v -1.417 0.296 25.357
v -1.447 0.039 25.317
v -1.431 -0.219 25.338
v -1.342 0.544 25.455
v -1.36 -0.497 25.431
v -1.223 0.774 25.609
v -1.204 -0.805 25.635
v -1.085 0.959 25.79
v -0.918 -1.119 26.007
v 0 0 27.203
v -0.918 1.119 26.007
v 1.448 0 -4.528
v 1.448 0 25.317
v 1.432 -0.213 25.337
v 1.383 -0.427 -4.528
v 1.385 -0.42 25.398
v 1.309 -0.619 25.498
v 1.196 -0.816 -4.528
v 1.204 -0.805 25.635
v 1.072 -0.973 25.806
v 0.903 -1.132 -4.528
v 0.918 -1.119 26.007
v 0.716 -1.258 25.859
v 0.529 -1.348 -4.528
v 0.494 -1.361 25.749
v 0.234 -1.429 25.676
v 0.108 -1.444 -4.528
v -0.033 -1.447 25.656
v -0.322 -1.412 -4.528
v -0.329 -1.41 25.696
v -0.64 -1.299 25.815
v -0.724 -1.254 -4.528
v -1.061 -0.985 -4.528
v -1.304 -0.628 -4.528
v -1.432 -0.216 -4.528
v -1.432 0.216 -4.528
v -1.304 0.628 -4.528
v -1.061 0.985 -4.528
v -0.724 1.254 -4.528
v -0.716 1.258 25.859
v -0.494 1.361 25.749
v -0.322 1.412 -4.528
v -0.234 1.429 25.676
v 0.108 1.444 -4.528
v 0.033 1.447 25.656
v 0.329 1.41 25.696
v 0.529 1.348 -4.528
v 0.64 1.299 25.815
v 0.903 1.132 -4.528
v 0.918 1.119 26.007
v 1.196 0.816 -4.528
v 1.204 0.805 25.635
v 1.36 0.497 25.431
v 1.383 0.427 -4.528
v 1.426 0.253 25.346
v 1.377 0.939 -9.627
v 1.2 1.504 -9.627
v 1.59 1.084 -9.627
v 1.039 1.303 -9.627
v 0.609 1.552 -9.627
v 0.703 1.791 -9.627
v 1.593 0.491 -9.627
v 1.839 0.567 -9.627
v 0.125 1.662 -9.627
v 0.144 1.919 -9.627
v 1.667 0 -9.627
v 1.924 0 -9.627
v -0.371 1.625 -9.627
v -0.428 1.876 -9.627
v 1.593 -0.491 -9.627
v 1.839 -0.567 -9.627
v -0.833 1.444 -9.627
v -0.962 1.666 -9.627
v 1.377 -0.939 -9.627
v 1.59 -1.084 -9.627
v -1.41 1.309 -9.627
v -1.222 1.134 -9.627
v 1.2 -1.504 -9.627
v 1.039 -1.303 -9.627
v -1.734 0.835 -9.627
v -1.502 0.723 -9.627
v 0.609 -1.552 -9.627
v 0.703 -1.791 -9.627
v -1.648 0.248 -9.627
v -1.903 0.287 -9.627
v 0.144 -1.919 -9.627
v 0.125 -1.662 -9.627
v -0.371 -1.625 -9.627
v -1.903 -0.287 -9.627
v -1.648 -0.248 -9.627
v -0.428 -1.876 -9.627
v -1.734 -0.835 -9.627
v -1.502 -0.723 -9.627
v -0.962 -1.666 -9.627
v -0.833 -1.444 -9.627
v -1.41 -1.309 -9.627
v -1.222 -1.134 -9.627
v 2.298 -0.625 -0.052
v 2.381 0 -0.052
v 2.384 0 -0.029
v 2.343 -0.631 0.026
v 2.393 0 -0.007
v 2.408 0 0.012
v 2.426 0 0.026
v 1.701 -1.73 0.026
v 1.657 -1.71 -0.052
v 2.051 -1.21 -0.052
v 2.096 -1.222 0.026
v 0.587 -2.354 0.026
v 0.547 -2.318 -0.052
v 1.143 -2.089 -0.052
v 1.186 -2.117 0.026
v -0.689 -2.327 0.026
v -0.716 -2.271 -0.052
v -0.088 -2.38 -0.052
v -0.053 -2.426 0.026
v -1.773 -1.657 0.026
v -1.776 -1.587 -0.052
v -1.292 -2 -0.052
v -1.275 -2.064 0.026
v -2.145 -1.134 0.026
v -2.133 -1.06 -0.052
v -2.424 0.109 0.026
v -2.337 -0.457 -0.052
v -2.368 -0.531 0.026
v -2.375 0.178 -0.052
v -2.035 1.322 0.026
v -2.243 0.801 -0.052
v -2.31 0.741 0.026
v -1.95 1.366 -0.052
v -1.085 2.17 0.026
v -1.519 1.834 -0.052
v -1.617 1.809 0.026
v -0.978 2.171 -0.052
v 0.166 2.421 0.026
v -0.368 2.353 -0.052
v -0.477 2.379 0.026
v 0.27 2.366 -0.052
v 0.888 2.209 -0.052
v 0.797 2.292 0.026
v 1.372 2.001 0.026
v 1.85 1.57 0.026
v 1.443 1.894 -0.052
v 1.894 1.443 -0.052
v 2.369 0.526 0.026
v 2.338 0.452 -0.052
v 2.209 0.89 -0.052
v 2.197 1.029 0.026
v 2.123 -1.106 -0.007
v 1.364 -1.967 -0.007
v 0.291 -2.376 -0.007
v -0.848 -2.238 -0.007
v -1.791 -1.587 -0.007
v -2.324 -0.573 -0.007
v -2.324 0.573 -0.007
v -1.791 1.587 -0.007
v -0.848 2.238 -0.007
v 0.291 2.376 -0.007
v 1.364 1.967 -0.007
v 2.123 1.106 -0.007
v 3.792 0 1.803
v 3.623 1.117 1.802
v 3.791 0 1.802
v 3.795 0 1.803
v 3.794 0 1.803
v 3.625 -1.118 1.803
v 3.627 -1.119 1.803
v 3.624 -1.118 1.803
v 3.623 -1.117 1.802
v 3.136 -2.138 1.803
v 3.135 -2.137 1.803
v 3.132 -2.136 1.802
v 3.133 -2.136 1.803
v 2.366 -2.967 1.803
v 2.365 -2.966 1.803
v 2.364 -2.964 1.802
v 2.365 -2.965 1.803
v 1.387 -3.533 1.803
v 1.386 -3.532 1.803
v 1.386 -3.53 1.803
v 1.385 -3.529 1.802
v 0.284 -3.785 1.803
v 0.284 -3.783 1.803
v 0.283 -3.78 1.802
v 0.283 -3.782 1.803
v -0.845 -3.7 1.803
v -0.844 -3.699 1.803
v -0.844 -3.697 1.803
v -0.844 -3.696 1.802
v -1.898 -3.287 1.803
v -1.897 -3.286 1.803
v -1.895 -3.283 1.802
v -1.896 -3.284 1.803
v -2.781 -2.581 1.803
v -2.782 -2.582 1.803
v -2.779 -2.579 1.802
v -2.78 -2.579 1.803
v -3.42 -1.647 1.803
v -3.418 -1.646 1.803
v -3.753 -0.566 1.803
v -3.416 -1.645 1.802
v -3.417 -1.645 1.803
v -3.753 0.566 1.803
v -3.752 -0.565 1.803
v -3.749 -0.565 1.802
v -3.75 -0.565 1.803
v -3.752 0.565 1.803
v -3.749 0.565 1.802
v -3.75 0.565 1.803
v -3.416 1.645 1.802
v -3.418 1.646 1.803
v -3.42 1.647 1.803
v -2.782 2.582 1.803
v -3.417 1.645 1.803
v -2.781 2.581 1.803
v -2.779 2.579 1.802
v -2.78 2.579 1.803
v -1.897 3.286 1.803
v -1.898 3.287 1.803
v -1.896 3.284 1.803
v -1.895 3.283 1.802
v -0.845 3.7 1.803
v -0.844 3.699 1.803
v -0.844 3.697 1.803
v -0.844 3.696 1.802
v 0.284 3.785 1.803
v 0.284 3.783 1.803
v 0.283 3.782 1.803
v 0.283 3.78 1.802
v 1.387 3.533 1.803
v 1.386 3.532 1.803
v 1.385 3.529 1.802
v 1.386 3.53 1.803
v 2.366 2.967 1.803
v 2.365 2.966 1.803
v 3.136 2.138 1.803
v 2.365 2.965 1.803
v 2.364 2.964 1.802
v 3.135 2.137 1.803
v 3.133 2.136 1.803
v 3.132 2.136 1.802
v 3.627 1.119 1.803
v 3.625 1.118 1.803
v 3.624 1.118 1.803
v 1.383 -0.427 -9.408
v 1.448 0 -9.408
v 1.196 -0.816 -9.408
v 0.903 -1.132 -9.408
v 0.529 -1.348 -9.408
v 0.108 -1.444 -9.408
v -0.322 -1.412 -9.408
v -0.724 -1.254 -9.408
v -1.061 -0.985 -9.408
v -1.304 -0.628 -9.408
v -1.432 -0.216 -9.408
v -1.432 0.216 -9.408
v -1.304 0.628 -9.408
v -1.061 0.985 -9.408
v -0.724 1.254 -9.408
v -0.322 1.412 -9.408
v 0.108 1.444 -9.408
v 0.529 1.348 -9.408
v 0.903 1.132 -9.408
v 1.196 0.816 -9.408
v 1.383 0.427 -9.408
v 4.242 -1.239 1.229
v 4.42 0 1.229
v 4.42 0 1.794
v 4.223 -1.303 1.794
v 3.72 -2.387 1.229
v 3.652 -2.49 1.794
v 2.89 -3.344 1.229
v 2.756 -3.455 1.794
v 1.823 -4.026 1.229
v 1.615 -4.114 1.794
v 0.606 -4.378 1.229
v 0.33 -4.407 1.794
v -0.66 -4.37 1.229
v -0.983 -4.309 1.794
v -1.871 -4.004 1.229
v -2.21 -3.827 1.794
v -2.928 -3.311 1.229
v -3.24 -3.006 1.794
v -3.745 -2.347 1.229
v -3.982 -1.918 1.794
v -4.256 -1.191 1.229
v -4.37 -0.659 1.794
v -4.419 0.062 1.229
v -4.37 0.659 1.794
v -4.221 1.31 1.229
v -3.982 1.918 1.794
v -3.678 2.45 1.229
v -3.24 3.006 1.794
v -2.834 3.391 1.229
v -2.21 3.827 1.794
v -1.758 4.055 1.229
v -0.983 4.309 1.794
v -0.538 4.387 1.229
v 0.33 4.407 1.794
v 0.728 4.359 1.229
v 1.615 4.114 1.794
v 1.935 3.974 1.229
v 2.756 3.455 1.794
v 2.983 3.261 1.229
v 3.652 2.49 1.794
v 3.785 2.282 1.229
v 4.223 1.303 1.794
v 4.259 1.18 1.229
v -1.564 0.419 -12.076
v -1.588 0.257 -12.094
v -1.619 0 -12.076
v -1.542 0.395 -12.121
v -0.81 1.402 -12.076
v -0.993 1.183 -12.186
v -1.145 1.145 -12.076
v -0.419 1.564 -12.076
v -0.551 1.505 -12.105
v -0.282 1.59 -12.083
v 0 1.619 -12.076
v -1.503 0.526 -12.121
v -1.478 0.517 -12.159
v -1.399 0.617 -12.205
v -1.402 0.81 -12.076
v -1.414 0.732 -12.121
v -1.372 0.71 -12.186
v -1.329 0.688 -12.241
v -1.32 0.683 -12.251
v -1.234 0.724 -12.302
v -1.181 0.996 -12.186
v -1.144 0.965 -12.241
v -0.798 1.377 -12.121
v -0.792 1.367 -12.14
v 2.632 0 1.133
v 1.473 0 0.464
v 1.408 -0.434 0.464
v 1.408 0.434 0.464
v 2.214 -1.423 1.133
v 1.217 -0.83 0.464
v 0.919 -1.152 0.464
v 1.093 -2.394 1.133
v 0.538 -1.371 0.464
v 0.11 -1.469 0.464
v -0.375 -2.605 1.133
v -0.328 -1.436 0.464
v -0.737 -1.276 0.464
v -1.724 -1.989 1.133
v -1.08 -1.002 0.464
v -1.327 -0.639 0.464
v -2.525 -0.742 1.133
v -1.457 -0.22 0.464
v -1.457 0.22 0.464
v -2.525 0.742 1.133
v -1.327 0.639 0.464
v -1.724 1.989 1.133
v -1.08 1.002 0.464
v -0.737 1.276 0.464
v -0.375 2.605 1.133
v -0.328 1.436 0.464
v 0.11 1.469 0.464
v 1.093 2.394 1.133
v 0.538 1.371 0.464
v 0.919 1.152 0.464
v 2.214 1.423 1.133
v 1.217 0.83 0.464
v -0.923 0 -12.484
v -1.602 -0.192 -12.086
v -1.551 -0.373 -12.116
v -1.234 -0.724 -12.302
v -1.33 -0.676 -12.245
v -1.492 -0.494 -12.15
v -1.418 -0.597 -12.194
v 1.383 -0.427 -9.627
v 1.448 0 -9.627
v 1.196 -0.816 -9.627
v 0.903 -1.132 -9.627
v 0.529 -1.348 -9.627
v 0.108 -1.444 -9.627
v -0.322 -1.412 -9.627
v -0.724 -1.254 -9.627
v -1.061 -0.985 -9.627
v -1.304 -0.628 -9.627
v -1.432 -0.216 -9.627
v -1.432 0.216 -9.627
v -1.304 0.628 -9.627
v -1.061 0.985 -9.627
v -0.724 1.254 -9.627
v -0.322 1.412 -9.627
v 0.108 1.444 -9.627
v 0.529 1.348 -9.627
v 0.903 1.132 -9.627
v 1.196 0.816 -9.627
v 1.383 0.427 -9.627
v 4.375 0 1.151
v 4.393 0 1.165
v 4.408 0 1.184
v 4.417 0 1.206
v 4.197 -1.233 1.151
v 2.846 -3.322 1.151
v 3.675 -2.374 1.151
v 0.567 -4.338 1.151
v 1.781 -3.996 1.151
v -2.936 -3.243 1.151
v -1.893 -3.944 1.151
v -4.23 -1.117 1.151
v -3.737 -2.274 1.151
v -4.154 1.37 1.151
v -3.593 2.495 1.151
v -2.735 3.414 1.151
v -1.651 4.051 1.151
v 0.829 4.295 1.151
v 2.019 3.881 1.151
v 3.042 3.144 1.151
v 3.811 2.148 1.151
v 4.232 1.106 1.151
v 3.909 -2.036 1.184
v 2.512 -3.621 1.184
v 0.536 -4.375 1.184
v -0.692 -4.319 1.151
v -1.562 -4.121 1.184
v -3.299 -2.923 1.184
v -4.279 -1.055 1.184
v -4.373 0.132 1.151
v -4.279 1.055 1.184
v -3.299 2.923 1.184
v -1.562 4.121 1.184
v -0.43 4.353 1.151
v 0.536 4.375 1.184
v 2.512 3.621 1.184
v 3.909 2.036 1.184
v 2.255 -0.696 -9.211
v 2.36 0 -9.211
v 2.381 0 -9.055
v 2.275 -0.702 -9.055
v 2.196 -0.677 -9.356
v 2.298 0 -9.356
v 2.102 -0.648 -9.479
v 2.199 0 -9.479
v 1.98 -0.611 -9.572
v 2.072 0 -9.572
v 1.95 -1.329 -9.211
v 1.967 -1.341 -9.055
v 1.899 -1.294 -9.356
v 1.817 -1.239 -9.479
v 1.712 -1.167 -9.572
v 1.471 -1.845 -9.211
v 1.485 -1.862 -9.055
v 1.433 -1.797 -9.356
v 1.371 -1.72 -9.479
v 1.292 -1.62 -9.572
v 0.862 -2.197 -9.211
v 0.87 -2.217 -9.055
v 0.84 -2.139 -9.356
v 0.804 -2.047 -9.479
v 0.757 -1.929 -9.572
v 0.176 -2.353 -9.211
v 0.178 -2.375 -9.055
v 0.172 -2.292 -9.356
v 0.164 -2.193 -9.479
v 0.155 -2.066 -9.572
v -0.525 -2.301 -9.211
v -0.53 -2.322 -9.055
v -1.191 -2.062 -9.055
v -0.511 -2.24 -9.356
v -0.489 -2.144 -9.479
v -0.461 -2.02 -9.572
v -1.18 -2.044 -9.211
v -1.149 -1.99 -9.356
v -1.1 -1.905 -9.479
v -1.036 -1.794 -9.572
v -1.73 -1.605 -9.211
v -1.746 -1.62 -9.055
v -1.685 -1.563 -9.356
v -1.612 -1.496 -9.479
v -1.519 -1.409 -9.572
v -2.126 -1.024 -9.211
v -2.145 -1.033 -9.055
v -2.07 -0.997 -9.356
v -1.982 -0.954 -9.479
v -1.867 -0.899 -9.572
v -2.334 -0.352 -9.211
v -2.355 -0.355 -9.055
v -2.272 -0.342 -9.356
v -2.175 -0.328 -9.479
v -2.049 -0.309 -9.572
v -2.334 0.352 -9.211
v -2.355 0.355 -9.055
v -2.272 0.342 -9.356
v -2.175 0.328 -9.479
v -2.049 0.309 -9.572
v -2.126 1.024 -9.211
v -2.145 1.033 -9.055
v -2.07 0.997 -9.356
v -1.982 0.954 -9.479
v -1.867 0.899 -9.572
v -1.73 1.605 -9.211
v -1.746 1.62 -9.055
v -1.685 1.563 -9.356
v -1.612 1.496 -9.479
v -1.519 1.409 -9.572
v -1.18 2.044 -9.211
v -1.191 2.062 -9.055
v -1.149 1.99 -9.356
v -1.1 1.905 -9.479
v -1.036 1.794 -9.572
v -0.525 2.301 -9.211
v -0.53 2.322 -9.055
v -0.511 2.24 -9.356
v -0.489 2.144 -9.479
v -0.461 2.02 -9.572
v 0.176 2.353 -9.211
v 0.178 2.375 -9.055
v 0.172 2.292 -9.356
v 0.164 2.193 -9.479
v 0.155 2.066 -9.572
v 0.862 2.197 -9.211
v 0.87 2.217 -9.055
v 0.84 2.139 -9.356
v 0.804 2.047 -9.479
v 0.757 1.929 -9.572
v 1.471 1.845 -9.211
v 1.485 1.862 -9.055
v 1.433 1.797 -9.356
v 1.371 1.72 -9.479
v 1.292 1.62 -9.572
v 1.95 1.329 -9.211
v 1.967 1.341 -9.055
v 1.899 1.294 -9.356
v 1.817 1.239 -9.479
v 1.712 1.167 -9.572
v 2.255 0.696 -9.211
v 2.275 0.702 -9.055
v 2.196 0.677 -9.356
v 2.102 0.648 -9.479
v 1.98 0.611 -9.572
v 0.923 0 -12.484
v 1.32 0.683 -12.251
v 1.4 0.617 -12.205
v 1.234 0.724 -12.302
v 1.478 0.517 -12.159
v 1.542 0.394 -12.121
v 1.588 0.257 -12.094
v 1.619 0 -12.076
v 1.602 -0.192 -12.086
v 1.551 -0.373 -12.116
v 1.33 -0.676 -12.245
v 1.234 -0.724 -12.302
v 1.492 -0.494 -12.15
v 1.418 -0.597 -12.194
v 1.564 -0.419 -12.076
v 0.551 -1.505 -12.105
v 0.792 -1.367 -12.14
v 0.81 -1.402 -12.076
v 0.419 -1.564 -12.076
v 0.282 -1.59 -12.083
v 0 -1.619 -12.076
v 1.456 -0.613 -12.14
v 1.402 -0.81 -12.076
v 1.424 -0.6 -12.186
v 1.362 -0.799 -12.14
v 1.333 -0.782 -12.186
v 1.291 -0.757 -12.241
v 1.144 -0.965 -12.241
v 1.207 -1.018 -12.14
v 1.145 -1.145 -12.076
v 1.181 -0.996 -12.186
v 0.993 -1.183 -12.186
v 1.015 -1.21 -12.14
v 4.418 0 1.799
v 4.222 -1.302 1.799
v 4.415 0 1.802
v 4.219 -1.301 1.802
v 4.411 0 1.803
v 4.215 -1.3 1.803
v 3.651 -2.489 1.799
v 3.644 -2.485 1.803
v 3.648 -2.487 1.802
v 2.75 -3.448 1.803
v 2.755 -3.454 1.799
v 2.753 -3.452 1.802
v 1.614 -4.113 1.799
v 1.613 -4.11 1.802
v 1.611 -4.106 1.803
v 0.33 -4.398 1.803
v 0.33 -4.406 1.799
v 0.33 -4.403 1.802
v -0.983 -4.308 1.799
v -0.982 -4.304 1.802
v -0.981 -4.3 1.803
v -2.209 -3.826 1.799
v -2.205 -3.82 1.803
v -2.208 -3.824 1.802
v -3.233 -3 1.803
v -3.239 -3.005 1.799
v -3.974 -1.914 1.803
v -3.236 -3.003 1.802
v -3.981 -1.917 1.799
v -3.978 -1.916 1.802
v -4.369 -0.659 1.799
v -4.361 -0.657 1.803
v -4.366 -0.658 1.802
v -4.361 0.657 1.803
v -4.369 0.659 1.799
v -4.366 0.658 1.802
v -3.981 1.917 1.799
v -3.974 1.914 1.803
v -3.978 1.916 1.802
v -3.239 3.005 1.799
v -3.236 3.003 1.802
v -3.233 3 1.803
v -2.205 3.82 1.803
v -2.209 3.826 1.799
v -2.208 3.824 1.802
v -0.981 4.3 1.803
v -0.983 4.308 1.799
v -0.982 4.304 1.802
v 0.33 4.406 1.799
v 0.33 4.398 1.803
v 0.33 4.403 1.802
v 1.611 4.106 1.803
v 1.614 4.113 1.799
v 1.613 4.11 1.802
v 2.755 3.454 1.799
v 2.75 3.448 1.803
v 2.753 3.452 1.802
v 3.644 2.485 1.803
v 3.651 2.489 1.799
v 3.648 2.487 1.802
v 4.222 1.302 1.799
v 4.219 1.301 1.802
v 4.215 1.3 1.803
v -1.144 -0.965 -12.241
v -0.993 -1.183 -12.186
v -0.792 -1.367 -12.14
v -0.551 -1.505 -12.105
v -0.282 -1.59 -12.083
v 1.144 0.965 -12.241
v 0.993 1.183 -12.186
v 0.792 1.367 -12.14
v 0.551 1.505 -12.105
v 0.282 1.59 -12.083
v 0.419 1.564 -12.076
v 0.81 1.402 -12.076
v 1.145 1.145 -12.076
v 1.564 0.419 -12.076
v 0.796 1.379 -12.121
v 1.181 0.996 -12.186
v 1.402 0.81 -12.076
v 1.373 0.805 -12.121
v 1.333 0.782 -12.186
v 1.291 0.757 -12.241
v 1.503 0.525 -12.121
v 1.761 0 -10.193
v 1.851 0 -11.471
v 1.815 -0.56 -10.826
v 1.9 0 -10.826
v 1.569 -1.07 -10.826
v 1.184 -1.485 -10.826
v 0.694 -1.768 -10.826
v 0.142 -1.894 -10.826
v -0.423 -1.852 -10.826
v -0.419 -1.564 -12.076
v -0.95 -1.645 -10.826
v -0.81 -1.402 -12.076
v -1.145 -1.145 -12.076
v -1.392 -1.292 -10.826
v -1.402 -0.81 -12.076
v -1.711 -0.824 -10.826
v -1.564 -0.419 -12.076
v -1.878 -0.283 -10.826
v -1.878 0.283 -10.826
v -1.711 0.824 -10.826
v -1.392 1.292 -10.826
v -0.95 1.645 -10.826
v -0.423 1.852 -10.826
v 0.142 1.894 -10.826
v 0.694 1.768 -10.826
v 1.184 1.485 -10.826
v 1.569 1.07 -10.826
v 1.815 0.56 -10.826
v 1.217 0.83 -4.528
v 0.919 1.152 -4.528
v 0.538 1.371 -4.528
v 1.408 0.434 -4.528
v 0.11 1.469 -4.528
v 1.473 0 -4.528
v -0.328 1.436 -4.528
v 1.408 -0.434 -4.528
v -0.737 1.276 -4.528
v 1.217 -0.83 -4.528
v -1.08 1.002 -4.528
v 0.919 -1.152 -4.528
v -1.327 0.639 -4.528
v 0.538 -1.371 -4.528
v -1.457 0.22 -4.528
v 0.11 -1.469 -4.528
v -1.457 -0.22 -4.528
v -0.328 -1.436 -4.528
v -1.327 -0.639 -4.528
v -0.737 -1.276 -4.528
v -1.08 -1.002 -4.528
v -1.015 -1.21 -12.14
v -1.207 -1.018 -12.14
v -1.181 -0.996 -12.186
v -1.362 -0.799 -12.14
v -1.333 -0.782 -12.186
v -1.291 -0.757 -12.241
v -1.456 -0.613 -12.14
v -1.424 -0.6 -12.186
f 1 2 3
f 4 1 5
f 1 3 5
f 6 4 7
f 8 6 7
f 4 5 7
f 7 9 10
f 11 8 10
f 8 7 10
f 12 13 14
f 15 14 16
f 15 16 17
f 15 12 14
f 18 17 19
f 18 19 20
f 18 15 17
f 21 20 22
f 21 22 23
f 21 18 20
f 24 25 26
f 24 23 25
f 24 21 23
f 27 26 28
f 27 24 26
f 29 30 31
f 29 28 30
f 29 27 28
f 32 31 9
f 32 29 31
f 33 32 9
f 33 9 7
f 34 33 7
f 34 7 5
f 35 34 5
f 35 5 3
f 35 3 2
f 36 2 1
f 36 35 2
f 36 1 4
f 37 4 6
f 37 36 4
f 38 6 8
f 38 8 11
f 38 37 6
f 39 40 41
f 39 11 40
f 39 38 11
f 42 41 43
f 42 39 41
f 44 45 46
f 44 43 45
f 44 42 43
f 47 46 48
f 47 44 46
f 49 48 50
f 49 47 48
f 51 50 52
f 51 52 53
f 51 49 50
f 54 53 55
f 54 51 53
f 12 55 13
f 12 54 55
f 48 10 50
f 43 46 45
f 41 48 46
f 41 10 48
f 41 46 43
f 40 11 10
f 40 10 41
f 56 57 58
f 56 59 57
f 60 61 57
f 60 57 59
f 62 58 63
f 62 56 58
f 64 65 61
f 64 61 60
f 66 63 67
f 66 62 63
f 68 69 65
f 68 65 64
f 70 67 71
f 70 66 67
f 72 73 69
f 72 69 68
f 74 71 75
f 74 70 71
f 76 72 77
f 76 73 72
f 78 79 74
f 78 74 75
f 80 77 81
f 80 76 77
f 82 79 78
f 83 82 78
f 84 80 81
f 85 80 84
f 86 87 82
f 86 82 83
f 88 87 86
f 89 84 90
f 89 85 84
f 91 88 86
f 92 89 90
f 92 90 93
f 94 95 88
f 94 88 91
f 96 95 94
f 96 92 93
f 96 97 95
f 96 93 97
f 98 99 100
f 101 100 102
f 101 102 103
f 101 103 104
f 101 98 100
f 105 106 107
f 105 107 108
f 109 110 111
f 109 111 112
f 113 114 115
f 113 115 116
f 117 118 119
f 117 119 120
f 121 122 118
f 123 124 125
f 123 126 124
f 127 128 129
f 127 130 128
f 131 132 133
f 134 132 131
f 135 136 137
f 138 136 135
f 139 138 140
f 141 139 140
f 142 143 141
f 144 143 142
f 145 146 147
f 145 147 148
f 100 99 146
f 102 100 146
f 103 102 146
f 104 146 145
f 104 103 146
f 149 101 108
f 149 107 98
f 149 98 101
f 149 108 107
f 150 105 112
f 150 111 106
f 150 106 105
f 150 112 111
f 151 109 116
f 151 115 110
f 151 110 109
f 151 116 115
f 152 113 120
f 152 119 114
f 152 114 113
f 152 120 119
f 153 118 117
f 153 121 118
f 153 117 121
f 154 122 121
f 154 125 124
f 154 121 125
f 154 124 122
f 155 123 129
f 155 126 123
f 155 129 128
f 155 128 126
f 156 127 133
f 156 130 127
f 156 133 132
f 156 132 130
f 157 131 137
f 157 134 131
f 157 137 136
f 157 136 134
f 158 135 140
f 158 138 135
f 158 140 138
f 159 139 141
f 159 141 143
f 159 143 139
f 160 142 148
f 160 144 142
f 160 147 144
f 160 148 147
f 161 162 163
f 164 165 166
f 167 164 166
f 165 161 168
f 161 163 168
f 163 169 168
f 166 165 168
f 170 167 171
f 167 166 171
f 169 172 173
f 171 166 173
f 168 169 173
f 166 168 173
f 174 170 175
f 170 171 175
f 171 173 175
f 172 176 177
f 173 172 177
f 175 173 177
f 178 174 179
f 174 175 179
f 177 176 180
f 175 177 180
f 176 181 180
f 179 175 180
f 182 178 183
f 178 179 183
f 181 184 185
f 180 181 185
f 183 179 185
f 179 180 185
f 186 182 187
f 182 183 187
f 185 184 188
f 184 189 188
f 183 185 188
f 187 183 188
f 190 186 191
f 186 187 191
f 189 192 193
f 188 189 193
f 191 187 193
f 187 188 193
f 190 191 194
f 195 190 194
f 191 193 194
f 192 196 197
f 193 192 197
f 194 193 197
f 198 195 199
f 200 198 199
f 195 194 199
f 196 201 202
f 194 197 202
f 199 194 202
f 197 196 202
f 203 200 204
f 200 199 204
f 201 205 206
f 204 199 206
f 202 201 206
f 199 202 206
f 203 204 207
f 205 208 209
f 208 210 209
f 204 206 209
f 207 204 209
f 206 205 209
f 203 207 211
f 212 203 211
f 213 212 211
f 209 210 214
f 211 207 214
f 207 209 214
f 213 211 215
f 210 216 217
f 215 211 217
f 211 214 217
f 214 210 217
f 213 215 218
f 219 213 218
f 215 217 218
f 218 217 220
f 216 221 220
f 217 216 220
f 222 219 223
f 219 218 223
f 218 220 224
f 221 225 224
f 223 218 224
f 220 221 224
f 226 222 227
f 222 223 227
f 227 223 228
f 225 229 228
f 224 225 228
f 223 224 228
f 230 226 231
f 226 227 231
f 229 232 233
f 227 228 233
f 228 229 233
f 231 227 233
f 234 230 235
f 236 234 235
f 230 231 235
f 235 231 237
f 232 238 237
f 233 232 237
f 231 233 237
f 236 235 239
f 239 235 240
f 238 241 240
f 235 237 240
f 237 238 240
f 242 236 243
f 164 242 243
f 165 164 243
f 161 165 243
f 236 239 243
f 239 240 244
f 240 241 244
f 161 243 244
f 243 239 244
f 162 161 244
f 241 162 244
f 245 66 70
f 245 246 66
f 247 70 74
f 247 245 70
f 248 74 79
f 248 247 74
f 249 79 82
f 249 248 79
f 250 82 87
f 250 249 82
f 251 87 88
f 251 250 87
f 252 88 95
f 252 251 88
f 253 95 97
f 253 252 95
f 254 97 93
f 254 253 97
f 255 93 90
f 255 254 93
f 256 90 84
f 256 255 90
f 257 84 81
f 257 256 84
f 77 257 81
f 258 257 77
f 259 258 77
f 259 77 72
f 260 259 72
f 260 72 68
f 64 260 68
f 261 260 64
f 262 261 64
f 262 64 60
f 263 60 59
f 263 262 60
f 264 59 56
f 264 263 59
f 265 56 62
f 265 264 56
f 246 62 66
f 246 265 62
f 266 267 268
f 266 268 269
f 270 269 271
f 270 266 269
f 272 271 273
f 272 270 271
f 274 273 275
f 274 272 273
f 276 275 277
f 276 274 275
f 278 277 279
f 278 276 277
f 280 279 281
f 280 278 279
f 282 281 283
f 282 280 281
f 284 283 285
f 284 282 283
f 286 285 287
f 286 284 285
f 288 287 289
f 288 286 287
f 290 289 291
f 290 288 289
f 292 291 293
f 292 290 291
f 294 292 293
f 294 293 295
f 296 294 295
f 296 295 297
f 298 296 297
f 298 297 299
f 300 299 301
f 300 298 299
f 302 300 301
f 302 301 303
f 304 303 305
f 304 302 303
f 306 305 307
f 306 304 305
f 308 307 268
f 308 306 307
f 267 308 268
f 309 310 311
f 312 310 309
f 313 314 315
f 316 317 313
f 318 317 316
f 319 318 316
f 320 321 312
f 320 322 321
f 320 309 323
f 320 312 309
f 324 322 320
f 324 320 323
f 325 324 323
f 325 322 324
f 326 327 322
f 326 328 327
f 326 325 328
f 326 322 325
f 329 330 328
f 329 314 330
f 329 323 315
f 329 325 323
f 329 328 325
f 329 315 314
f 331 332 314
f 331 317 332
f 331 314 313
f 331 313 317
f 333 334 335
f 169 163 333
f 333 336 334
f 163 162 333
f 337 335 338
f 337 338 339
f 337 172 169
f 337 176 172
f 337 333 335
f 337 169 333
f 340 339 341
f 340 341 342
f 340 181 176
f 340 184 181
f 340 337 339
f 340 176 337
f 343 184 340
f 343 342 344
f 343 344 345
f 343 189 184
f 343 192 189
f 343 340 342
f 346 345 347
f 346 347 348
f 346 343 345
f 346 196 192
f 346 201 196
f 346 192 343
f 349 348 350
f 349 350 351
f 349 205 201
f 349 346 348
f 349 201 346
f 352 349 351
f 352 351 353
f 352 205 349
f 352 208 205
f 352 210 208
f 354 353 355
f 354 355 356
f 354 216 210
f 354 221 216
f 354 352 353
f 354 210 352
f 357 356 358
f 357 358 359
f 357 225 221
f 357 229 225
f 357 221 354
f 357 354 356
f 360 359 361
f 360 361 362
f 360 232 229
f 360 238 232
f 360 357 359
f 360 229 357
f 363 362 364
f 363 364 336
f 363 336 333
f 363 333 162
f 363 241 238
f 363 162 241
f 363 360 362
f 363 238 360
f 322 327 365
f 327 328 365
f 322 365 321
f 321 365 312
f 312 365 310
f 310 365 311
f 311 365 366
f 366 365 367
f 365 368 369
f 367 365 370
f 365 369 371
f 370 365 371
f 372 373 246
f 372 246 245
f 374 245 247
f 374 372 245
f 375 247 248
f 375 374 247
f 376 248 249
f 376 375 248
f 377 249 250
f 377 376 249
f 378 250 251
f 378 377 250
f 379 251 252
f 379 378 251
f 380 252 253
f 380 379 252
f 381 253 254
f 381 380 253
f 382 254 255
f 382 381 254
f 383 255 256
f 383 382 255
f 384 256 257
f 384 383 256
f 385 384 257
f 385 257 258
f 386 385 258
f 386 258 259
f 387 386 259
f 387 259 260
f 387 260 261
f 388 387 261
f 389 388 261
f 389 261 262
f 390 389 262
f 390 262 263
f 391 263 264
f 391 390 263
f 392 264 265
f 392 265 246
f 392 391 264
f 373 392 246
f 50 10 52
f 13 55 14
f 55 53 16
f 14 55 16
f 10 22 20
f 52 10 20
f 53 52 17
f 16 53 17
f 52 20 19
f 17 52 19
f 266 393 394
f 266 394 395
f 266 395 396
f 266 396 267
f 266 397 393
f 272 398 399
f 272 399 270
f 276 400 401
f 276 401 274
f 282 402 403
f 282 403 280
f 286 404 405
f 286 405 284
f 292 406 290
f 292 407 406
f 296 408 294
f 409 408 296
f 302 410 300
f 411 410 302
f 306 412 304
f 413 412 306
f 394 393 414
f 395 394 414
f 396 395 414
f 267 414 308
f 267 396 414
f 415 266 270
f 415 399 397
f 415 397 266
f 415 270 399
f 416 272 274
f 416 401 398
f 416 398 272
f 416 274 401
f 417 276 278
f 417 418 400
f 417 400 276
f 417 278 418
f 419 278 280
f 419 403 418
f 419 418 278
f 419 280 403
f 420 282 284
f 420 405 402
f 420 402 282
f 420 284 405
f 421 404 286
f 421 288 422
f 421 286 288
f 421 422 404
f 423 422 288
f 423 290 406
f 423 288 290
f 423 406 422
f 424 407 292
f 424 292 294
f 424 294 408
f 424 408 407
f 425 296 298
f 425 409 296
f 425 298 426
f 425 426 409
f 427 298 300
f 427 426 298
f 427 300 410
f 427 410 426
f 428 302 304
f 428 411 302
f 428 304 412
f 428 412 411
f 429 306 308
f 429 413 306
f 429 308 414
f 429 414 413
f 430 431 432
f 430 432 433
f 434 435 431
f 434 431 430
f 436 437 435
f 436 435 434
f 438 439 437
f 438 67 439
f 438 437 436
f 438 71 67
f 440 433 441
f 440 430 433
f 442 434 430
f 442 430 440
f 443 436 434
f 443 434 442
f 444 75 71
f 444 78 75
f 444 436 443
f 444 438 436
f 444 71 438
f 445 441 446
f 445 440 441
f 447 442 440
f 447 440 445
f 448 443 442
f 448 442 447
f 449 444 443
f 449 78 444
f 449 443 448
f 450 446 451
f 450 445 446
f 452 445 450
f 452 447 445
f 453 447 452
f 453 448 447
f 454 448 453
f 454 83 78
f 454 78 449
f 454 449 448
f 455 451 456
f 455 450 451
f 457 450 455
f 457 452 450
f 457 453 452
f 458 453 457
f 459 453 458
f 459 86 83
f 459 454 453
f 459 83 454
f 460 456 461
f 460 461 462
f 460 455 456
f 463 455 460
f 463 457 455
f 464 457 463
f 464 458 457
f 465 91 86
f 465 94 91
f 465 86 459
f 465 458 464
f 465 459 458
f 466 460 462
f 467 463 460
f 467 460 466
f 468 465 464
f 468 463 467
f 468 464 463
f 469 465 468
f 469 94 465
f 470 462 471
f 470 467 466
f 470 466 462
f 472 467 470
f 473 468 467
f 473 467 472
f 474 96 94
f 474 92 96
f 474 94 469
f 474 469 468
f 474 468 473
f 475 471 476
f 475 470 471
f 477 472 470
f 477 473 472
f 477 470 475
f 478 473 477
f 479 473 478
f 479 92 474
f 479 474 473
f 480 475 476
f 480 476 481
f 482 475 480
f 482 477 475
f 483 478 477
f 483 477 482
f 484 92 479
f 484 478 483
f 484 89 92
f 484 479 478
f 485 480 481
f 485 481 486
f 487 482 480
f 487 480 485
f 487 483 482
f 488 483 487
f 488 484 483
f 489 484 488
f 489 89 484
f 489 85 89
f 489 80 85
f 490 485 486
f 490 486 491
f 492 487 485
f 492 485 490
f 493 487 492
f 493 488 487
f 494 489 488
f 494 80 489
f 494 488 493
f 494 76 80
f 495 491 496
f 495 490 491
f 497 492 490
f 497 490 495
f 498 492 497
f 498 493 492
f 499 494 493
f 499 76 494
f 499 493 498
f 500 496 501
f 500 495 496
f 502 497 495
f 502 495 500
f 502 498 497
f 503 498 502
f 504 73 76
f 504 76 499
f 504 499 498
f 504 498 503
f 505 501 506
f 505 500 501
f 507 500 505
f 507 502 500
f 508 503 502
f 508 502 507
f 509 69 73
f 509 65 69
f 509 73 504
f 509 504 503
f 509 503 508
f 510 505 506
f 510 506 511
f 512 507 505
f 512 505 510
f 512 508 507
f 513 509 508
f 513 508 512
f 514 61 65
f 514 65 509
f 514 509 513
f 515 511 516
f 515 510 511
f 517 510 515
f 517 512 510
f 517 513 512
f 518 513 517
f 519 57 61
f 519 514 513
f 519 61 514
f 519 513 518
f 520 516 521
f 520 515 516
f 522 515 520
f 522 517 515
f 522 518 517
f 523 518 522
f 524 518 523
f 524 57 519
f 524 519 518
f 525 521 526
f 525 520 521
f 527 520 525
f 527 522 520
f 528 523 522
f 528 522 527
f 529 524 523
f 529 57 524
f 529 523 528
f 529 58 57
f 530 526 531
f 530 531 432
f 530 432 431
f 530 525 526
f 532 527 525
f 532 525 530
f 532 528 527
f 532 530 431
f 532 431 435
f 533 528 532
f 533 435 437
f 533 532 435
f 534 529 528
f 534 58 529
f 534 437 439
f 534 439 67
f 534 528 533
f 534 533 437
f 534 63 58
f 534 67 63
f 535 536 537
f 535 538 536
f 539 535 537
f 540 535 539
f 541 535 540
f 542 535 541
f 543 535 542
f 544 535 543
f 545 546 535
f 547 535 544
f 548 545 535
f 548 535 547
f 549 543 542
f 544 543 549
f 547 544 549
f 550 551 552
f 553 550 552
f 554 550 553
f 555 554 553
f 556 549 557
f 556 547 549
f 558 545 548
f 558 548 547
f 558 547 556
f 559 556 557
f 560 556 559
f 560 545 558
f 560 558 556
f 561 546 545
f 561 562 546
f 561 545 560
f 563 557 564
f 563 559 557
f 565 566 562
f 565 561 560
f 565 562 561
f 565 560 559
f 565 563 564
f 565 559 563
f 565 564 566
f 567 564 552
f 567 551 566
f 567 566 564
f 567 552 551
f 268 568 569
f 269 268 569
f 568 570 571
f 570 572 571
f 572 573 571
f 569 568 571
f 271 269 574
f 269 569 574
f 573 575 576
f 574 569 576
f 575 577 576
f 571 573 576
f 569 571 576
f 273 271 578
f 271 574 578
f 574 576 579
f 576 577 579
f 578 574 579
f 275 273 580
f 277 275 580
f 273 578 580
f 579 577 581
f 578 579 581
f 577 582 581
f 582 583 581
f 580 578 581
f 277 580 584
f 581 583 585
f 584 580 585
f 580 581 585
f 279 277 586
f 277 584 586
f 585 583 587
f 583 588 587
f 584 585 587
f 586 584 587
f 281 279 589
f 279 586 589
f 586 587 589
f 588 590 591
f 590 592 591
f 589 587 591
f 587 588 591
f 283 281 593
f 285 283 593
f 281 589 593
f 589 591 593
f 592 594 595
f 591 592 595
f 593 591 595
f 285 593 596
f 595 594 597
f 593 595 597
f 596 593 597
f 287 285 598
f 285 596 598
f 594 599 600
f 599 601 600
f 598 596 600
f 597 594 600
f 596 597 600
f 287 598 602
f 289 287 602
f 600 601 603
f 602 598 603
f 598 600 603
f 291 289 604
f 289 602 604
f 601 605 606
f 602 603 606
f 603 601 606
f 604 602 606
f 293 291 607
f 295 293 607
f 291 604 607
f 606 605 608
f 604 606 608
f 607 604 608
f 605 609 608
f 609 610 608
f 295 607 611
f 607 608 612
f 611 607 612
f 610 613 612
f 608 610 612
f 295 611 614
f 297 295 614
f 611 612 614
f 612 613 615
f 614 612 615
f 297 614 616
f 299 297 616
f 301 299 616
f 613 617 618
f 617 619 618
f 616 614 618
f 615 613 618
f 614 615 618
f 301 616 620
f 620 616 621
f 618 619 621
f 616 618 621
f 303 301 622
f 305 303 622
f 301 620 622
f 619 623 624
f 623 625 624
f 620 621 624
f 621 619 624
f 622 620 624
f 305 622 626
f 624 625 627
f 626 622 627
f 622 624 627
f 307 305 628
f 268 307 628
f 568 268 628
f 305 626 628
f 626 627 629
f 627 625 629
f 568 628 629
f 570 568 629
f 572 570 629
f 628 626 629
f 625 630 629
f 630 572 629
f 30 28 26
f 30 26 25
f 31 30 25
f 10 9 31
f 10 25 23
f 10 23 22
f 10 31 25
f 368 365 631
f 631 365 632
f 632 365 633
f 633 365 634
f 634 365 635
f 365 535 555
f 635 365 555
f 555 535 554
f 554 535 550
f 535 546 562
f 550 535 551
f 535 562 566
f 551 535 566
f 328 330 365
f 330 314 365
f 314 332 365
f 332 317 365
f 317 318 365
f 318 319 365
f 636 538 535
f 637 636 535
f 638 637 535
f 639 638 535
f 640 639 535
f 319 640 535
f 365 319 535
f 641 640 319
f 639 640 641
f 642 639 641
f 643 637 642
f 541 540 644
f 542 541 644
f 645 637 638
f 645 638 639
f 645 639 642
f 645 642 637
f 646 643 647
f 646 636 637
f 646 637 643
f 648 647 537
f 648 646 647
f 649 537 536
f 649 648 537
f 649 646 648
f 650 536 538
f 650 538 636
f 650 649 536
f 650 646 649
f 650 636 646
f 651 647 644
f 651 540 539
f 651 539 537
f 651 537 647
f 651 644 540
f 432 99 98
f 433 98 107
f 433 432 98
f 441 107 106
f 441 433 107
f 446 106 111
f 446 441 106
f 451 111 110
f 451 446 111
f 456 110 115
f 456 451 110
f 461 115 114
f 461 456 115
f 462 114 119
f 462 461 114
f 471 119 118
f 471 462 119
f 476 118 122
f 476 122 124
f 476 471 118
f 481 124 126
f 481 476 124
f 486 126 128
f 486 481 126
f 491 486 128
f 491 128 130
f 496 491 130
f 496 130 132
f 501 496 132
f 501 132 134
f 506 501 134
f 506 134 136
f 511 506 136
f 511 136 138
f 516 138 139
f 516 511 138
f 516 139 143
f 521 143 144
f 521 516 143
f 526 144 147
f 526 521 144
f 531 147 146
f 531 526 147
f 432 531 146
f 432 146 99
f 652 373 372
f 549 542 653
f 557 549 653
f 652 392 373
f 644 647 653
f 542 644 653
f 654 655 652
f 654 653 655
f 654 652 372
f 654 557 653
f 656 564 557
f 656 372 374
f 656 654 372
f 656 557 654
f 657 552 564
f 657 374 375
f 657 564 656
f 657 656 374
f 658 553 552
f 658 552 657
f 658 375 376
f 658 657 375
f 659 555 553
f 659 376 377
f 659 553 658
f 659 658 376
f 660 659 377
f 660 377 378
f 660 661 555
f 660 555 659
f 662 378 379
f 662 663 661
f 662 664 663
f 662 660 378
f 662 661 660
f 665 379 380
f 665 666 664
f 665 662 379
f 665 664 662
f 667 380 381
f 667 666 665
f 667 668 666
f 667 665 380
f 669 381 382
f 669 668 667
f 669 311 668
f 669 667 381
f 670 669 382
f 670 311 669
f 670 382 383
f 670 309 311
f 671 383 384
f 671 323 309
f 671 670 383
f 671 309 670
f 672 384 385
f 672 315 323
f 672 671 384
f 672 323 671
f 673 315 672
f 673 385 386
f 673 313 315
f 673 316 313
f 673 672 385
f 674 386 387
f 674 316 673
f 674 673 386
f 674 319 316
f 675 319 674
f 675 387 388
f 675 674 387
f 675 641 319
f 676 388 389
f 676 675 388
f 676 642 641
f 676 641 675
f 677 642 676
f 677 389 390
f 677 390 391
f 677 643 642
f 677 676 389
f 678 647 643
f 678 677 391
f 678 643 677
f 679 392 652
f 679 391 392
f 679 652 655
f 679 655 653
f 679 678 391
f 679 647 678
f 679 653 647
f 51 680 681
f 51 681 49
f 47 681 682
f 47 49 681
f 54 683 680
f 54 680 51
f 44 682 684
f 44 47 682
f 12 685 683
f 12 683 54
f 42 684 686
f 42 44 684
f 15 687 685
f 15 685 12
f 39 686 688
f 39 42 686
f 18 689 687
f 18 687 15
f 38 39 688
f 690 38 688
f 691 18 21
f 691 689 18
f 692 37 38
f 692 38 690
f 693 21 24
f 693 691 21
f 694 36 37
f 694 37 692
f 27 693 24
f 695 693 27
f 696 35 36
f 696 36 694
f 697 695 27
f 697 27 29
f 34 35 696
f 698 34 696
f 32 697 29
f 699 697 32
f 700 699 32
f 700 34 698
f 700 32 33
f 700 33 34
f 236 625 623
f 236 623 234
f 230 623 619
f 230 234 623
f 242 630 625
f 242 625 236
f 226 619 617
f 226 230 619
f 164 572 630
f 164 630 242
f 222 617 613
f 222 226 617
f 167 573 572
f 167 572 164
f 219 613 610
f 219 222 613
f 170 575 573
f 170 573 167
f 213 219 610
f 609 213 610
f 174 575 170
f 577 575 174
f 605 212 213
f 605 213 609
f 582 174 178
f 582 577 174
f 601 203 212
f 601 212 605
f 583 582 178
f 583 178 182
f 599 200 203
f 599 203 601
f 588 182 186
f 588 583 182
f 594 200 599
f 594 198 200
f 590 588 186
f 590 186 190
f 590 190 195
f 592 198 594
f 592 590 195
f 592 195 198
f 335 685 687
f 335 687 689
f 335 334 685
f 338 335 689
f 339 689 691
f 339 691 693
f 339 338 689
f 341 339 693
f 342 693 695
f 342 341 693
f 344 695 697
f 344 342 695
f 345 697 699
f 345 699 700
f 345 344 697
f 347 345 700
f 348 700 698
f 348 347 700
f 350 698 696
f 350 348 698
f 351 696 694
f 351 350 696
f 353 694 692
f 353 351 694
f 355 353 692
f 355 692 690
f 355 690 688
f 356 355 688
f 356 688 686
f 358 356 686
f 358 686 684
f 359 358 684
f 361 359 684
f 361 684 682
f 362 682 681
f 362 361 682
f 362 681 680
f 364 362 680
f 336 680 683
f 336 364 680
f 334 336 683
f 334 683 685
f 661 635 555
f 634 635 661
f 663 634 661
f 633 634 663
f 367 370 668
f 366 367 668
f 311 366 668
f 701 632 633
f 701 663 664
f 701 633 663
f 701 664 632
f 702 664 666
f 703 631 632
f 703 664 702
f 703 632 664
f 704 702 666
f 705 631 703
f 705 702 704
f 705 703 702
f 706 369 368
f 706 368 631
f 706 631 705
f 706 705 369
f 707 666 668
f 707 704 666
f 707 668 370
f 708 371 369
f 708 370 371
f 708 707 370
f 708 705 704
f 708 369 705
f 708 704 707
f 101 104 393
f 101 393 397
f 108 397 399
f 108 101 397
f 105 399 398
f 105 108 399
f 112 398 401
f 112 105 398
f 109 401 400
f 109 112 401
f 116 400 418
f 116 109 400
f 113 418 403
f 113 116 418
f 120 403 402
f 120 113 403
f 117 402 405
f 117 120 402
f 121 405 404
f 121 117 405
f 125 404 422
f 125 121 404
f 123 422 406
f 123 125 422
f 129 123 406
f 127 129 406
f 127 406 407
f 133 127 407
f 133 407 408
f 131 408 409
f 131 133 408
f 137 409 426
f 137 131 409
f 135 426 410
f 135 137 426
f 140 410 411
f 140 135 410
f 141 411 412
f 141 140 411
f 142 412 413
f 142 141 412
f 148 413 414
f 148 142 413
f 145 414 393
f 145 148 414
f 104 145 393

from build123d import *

# Parameters (mm, degrees)
CUT_EXTRUDE1_DEPTH      = 28.912196257
CUT_EXTRUDE1_DEPTH_BACK = 28.912196257
CUT_EXTRUDE2_DEPTH      = 28.912196257
CUT_EXTRUDE2_DEPTH_BACK = 28.912196257
BOSS_EXTRUDE1_DEPTH     = 1.905
CUT_EXTRUDE6_DEPTH      = 28.912196257
CUT_EXTRUDE6_DEPTH_BACK = 28.912196257
FILLET1_R               = 0.09017
FILLET2_R               = 0.009017


with BuildPart() as part:
    # Sketch2 → Revolve1 (revolve)
    with BuildSketch(Plane(origin=(0, 0, 0), x_dir=(0, 0, -1), z_dir=(1, 0, 0)), mode=Mode.PRIVATE) as revolve1_sk:
        with BuildLine():
            Line((-27.2034, 0), (-27.2034, 1.4478))
            Line((-27.2034, 1.4478), (-1.8034, 1.4478))
            Line((-1.8034, 1.4478), (4.52755, 1.4478))
            Line((4.52755, 1.4478), (4.52755, 1.4732))
            Line((4.52755, 1.4732), (-0.464038642, 1.4732))
            Line((-0.464038642, 1.4732), (-1.8034, 3.793041921))
            Line((-1.8034, 3.793041921), (-1.8034, 4.4196))
            Line((-1.8034, 4.4196), (-1.176841921, 4.4196))
            Line((-1.176841921, 4.4196), (0, 2.38125))
            Line((0, 2.38125), (9.0551, 2.38125))
            ThreePointArc((9.0551, 2.38125), (9.512523188, 2.16140105), (9.6266, 1.666875))
            Line((9.6266, 1.666875), (9.407525, 1.4478))
            Line((9.407525, 1.4478), (9.6266, 1.4478))
            ThreePointArc((9.6266, 1.4478), (10.825683647, 1.899538893), (12.076006707, 1.61925))
            Line((12.076006707, 1.61925), (12.076006707, 0))
            Line((12.076006707, 0), (9.6266, 0))
            Line((9.6266, 0), (-27.2034, 0))
        make_face()
    revolve(revolve1_sk.sketch.rotate(Axis((0, 0, 27.2034), (0, 0, -1)), 90), axis=Axis((0, 0, 27.2034), (0, 0, -1)))

    # Sketch3 → Cut-Extrude1 (cut, two sides: drawn at the far end of the back side and taken through both)
    with BuildSketch(Plane(origin=(0, 0, 0), x_dir=(1, 0, 0), z_dir=(0, 1, 0)).offset(-CUT_EXTRUDE1_DEPTH_BACK)):
        Polygon((0, -27.2034), (1.651, -25.051774909), (1.651, -27.7114), (-1.651, -27.7114), (-1.651, -25.051774909), align=None)
    extrude(amount=CUT_EXTRUDE1_DEPTH + CUT_EXTRUDE1_DEPTH_BACK, mode=Mode.SUBTRACT)

    # Sketch5 → Cut-Extrude2 (cut, two sides: drawn at the far end of the back side and taken through both)
    with BuildSketch(Plane(origin=(0, 0, 0), x_dir=(0, 0, -1), z_dir=(1, 0, 0)).offset(-CUT_EXTRUDE2_DEPTH_BACK)):
        Polygon((-27.2034, 0), (-25.316590305, 1.7653), (-27.5209, 1.7653), (-27.5209, -1.7653), (-25.316590305, -1.7653), align=None)
    extrude(amount=CUT_EXTRUDE2_DEPTH + CUT_EXTRUDE2_DEPTH_BACK, mode=Mode.SUBTRACT)

    # Sketch10 → Boss-Extrude1 (add, symmetric)
    with BuildSketch(Plane(origin=(0, 0, 0), x_dir=(0, 0, -1), z_dir=(1, 0, 0))):
        Polygon((12.076006707, 1.61925), (12.4841, 0), (12.076006707, -1.61925), align=None)
    extrude(amount=BOSS_EXTRUDE1_DEPTH, both=True)

    # Sketch12 → Cut-Revolve1 (revolve, cut)
    with BuildSketch(Plane(origin=(0, 0, 0), x_dir=(1, 0, 0), z_dir=(0, 1, 0)), mode=Mode.PRIVATE) as cut_revolve1_sk:
        with BuildLine():
            Line((-0.922633935, 12.4841), (-0.922633935, 15.981066065))
            Line((-0.922633935, 15.981066065), (-4.4196, 15.981066065))
            Line((-4.4196, 15.981066065), (-4.4196, 9.6266))
            Line((-4.4196, 9.6266), (-1.4478, 9.6266))
            ThreePointArc((-1.4478, 9.6266), (-1.899538893, 10.825683647), (-1.61925, 12.076006707))
            ThreePointArc((-1.61925, 12.076006707), (-1.326308952, 12.374564907), (-0.922633935, 12.4841))
        make_face()
    revolve(cut_revolve1_sk.sketch.rotate(Axis((0, 0, 0), (0, 0, -1)), 270), axis=Axis((0, 0, 0), (0, 0, -1)), mode=Mode.SUBTRACT)

    # Sketch13 → Cut-Extrude6 (cut, two sides: drawn at the far end of the back side and taken through both)
    with BuildSketch(Plane(origin=(0, 0, 0), x_dir=(1, 0, 0), z_dir=(0, 1, 0)).offset(-CUT_EXTRUDE6_DEPTH_BACK)):
        Polygon((-0.922633935, 12.4841), (-1.61925, 12.076006707), (-1.61925, 15.981066065), (-0.922633935, 15.981066065), align=None)
        Polygon((1.61925, 12.076006707), (1.61925, 15.981066065), (0.922633935, 15.981066065), (0.922633935, 12.4841), align=None)
    extrude(amount=CUT_EXTRUDE6_DEPTH + CUT_EXTRUDE6_DEPTH_BACK, mode=Mode.SUBTRACT)

    # Fillet1
    fillet1_edges = [part.edges().sort_by_distance(p)[0] for p in [
        (-2.38125, 0, 0),
        (-4.4196, 0, 1.176841921),
    ]]
    fillet(fillet1_edges, radius=FILLET1_R)

    # Fillet2
    fillet2_edges = [part.edges().sort_by_distance(p)[0] for p in [
        (-4.4196, 0, 1.8034),
        (-3.793041921, 0, 1.8034),
    ]]
    fillet(fillet2_edges, radius=FILLET2_R)


solid = part.part
